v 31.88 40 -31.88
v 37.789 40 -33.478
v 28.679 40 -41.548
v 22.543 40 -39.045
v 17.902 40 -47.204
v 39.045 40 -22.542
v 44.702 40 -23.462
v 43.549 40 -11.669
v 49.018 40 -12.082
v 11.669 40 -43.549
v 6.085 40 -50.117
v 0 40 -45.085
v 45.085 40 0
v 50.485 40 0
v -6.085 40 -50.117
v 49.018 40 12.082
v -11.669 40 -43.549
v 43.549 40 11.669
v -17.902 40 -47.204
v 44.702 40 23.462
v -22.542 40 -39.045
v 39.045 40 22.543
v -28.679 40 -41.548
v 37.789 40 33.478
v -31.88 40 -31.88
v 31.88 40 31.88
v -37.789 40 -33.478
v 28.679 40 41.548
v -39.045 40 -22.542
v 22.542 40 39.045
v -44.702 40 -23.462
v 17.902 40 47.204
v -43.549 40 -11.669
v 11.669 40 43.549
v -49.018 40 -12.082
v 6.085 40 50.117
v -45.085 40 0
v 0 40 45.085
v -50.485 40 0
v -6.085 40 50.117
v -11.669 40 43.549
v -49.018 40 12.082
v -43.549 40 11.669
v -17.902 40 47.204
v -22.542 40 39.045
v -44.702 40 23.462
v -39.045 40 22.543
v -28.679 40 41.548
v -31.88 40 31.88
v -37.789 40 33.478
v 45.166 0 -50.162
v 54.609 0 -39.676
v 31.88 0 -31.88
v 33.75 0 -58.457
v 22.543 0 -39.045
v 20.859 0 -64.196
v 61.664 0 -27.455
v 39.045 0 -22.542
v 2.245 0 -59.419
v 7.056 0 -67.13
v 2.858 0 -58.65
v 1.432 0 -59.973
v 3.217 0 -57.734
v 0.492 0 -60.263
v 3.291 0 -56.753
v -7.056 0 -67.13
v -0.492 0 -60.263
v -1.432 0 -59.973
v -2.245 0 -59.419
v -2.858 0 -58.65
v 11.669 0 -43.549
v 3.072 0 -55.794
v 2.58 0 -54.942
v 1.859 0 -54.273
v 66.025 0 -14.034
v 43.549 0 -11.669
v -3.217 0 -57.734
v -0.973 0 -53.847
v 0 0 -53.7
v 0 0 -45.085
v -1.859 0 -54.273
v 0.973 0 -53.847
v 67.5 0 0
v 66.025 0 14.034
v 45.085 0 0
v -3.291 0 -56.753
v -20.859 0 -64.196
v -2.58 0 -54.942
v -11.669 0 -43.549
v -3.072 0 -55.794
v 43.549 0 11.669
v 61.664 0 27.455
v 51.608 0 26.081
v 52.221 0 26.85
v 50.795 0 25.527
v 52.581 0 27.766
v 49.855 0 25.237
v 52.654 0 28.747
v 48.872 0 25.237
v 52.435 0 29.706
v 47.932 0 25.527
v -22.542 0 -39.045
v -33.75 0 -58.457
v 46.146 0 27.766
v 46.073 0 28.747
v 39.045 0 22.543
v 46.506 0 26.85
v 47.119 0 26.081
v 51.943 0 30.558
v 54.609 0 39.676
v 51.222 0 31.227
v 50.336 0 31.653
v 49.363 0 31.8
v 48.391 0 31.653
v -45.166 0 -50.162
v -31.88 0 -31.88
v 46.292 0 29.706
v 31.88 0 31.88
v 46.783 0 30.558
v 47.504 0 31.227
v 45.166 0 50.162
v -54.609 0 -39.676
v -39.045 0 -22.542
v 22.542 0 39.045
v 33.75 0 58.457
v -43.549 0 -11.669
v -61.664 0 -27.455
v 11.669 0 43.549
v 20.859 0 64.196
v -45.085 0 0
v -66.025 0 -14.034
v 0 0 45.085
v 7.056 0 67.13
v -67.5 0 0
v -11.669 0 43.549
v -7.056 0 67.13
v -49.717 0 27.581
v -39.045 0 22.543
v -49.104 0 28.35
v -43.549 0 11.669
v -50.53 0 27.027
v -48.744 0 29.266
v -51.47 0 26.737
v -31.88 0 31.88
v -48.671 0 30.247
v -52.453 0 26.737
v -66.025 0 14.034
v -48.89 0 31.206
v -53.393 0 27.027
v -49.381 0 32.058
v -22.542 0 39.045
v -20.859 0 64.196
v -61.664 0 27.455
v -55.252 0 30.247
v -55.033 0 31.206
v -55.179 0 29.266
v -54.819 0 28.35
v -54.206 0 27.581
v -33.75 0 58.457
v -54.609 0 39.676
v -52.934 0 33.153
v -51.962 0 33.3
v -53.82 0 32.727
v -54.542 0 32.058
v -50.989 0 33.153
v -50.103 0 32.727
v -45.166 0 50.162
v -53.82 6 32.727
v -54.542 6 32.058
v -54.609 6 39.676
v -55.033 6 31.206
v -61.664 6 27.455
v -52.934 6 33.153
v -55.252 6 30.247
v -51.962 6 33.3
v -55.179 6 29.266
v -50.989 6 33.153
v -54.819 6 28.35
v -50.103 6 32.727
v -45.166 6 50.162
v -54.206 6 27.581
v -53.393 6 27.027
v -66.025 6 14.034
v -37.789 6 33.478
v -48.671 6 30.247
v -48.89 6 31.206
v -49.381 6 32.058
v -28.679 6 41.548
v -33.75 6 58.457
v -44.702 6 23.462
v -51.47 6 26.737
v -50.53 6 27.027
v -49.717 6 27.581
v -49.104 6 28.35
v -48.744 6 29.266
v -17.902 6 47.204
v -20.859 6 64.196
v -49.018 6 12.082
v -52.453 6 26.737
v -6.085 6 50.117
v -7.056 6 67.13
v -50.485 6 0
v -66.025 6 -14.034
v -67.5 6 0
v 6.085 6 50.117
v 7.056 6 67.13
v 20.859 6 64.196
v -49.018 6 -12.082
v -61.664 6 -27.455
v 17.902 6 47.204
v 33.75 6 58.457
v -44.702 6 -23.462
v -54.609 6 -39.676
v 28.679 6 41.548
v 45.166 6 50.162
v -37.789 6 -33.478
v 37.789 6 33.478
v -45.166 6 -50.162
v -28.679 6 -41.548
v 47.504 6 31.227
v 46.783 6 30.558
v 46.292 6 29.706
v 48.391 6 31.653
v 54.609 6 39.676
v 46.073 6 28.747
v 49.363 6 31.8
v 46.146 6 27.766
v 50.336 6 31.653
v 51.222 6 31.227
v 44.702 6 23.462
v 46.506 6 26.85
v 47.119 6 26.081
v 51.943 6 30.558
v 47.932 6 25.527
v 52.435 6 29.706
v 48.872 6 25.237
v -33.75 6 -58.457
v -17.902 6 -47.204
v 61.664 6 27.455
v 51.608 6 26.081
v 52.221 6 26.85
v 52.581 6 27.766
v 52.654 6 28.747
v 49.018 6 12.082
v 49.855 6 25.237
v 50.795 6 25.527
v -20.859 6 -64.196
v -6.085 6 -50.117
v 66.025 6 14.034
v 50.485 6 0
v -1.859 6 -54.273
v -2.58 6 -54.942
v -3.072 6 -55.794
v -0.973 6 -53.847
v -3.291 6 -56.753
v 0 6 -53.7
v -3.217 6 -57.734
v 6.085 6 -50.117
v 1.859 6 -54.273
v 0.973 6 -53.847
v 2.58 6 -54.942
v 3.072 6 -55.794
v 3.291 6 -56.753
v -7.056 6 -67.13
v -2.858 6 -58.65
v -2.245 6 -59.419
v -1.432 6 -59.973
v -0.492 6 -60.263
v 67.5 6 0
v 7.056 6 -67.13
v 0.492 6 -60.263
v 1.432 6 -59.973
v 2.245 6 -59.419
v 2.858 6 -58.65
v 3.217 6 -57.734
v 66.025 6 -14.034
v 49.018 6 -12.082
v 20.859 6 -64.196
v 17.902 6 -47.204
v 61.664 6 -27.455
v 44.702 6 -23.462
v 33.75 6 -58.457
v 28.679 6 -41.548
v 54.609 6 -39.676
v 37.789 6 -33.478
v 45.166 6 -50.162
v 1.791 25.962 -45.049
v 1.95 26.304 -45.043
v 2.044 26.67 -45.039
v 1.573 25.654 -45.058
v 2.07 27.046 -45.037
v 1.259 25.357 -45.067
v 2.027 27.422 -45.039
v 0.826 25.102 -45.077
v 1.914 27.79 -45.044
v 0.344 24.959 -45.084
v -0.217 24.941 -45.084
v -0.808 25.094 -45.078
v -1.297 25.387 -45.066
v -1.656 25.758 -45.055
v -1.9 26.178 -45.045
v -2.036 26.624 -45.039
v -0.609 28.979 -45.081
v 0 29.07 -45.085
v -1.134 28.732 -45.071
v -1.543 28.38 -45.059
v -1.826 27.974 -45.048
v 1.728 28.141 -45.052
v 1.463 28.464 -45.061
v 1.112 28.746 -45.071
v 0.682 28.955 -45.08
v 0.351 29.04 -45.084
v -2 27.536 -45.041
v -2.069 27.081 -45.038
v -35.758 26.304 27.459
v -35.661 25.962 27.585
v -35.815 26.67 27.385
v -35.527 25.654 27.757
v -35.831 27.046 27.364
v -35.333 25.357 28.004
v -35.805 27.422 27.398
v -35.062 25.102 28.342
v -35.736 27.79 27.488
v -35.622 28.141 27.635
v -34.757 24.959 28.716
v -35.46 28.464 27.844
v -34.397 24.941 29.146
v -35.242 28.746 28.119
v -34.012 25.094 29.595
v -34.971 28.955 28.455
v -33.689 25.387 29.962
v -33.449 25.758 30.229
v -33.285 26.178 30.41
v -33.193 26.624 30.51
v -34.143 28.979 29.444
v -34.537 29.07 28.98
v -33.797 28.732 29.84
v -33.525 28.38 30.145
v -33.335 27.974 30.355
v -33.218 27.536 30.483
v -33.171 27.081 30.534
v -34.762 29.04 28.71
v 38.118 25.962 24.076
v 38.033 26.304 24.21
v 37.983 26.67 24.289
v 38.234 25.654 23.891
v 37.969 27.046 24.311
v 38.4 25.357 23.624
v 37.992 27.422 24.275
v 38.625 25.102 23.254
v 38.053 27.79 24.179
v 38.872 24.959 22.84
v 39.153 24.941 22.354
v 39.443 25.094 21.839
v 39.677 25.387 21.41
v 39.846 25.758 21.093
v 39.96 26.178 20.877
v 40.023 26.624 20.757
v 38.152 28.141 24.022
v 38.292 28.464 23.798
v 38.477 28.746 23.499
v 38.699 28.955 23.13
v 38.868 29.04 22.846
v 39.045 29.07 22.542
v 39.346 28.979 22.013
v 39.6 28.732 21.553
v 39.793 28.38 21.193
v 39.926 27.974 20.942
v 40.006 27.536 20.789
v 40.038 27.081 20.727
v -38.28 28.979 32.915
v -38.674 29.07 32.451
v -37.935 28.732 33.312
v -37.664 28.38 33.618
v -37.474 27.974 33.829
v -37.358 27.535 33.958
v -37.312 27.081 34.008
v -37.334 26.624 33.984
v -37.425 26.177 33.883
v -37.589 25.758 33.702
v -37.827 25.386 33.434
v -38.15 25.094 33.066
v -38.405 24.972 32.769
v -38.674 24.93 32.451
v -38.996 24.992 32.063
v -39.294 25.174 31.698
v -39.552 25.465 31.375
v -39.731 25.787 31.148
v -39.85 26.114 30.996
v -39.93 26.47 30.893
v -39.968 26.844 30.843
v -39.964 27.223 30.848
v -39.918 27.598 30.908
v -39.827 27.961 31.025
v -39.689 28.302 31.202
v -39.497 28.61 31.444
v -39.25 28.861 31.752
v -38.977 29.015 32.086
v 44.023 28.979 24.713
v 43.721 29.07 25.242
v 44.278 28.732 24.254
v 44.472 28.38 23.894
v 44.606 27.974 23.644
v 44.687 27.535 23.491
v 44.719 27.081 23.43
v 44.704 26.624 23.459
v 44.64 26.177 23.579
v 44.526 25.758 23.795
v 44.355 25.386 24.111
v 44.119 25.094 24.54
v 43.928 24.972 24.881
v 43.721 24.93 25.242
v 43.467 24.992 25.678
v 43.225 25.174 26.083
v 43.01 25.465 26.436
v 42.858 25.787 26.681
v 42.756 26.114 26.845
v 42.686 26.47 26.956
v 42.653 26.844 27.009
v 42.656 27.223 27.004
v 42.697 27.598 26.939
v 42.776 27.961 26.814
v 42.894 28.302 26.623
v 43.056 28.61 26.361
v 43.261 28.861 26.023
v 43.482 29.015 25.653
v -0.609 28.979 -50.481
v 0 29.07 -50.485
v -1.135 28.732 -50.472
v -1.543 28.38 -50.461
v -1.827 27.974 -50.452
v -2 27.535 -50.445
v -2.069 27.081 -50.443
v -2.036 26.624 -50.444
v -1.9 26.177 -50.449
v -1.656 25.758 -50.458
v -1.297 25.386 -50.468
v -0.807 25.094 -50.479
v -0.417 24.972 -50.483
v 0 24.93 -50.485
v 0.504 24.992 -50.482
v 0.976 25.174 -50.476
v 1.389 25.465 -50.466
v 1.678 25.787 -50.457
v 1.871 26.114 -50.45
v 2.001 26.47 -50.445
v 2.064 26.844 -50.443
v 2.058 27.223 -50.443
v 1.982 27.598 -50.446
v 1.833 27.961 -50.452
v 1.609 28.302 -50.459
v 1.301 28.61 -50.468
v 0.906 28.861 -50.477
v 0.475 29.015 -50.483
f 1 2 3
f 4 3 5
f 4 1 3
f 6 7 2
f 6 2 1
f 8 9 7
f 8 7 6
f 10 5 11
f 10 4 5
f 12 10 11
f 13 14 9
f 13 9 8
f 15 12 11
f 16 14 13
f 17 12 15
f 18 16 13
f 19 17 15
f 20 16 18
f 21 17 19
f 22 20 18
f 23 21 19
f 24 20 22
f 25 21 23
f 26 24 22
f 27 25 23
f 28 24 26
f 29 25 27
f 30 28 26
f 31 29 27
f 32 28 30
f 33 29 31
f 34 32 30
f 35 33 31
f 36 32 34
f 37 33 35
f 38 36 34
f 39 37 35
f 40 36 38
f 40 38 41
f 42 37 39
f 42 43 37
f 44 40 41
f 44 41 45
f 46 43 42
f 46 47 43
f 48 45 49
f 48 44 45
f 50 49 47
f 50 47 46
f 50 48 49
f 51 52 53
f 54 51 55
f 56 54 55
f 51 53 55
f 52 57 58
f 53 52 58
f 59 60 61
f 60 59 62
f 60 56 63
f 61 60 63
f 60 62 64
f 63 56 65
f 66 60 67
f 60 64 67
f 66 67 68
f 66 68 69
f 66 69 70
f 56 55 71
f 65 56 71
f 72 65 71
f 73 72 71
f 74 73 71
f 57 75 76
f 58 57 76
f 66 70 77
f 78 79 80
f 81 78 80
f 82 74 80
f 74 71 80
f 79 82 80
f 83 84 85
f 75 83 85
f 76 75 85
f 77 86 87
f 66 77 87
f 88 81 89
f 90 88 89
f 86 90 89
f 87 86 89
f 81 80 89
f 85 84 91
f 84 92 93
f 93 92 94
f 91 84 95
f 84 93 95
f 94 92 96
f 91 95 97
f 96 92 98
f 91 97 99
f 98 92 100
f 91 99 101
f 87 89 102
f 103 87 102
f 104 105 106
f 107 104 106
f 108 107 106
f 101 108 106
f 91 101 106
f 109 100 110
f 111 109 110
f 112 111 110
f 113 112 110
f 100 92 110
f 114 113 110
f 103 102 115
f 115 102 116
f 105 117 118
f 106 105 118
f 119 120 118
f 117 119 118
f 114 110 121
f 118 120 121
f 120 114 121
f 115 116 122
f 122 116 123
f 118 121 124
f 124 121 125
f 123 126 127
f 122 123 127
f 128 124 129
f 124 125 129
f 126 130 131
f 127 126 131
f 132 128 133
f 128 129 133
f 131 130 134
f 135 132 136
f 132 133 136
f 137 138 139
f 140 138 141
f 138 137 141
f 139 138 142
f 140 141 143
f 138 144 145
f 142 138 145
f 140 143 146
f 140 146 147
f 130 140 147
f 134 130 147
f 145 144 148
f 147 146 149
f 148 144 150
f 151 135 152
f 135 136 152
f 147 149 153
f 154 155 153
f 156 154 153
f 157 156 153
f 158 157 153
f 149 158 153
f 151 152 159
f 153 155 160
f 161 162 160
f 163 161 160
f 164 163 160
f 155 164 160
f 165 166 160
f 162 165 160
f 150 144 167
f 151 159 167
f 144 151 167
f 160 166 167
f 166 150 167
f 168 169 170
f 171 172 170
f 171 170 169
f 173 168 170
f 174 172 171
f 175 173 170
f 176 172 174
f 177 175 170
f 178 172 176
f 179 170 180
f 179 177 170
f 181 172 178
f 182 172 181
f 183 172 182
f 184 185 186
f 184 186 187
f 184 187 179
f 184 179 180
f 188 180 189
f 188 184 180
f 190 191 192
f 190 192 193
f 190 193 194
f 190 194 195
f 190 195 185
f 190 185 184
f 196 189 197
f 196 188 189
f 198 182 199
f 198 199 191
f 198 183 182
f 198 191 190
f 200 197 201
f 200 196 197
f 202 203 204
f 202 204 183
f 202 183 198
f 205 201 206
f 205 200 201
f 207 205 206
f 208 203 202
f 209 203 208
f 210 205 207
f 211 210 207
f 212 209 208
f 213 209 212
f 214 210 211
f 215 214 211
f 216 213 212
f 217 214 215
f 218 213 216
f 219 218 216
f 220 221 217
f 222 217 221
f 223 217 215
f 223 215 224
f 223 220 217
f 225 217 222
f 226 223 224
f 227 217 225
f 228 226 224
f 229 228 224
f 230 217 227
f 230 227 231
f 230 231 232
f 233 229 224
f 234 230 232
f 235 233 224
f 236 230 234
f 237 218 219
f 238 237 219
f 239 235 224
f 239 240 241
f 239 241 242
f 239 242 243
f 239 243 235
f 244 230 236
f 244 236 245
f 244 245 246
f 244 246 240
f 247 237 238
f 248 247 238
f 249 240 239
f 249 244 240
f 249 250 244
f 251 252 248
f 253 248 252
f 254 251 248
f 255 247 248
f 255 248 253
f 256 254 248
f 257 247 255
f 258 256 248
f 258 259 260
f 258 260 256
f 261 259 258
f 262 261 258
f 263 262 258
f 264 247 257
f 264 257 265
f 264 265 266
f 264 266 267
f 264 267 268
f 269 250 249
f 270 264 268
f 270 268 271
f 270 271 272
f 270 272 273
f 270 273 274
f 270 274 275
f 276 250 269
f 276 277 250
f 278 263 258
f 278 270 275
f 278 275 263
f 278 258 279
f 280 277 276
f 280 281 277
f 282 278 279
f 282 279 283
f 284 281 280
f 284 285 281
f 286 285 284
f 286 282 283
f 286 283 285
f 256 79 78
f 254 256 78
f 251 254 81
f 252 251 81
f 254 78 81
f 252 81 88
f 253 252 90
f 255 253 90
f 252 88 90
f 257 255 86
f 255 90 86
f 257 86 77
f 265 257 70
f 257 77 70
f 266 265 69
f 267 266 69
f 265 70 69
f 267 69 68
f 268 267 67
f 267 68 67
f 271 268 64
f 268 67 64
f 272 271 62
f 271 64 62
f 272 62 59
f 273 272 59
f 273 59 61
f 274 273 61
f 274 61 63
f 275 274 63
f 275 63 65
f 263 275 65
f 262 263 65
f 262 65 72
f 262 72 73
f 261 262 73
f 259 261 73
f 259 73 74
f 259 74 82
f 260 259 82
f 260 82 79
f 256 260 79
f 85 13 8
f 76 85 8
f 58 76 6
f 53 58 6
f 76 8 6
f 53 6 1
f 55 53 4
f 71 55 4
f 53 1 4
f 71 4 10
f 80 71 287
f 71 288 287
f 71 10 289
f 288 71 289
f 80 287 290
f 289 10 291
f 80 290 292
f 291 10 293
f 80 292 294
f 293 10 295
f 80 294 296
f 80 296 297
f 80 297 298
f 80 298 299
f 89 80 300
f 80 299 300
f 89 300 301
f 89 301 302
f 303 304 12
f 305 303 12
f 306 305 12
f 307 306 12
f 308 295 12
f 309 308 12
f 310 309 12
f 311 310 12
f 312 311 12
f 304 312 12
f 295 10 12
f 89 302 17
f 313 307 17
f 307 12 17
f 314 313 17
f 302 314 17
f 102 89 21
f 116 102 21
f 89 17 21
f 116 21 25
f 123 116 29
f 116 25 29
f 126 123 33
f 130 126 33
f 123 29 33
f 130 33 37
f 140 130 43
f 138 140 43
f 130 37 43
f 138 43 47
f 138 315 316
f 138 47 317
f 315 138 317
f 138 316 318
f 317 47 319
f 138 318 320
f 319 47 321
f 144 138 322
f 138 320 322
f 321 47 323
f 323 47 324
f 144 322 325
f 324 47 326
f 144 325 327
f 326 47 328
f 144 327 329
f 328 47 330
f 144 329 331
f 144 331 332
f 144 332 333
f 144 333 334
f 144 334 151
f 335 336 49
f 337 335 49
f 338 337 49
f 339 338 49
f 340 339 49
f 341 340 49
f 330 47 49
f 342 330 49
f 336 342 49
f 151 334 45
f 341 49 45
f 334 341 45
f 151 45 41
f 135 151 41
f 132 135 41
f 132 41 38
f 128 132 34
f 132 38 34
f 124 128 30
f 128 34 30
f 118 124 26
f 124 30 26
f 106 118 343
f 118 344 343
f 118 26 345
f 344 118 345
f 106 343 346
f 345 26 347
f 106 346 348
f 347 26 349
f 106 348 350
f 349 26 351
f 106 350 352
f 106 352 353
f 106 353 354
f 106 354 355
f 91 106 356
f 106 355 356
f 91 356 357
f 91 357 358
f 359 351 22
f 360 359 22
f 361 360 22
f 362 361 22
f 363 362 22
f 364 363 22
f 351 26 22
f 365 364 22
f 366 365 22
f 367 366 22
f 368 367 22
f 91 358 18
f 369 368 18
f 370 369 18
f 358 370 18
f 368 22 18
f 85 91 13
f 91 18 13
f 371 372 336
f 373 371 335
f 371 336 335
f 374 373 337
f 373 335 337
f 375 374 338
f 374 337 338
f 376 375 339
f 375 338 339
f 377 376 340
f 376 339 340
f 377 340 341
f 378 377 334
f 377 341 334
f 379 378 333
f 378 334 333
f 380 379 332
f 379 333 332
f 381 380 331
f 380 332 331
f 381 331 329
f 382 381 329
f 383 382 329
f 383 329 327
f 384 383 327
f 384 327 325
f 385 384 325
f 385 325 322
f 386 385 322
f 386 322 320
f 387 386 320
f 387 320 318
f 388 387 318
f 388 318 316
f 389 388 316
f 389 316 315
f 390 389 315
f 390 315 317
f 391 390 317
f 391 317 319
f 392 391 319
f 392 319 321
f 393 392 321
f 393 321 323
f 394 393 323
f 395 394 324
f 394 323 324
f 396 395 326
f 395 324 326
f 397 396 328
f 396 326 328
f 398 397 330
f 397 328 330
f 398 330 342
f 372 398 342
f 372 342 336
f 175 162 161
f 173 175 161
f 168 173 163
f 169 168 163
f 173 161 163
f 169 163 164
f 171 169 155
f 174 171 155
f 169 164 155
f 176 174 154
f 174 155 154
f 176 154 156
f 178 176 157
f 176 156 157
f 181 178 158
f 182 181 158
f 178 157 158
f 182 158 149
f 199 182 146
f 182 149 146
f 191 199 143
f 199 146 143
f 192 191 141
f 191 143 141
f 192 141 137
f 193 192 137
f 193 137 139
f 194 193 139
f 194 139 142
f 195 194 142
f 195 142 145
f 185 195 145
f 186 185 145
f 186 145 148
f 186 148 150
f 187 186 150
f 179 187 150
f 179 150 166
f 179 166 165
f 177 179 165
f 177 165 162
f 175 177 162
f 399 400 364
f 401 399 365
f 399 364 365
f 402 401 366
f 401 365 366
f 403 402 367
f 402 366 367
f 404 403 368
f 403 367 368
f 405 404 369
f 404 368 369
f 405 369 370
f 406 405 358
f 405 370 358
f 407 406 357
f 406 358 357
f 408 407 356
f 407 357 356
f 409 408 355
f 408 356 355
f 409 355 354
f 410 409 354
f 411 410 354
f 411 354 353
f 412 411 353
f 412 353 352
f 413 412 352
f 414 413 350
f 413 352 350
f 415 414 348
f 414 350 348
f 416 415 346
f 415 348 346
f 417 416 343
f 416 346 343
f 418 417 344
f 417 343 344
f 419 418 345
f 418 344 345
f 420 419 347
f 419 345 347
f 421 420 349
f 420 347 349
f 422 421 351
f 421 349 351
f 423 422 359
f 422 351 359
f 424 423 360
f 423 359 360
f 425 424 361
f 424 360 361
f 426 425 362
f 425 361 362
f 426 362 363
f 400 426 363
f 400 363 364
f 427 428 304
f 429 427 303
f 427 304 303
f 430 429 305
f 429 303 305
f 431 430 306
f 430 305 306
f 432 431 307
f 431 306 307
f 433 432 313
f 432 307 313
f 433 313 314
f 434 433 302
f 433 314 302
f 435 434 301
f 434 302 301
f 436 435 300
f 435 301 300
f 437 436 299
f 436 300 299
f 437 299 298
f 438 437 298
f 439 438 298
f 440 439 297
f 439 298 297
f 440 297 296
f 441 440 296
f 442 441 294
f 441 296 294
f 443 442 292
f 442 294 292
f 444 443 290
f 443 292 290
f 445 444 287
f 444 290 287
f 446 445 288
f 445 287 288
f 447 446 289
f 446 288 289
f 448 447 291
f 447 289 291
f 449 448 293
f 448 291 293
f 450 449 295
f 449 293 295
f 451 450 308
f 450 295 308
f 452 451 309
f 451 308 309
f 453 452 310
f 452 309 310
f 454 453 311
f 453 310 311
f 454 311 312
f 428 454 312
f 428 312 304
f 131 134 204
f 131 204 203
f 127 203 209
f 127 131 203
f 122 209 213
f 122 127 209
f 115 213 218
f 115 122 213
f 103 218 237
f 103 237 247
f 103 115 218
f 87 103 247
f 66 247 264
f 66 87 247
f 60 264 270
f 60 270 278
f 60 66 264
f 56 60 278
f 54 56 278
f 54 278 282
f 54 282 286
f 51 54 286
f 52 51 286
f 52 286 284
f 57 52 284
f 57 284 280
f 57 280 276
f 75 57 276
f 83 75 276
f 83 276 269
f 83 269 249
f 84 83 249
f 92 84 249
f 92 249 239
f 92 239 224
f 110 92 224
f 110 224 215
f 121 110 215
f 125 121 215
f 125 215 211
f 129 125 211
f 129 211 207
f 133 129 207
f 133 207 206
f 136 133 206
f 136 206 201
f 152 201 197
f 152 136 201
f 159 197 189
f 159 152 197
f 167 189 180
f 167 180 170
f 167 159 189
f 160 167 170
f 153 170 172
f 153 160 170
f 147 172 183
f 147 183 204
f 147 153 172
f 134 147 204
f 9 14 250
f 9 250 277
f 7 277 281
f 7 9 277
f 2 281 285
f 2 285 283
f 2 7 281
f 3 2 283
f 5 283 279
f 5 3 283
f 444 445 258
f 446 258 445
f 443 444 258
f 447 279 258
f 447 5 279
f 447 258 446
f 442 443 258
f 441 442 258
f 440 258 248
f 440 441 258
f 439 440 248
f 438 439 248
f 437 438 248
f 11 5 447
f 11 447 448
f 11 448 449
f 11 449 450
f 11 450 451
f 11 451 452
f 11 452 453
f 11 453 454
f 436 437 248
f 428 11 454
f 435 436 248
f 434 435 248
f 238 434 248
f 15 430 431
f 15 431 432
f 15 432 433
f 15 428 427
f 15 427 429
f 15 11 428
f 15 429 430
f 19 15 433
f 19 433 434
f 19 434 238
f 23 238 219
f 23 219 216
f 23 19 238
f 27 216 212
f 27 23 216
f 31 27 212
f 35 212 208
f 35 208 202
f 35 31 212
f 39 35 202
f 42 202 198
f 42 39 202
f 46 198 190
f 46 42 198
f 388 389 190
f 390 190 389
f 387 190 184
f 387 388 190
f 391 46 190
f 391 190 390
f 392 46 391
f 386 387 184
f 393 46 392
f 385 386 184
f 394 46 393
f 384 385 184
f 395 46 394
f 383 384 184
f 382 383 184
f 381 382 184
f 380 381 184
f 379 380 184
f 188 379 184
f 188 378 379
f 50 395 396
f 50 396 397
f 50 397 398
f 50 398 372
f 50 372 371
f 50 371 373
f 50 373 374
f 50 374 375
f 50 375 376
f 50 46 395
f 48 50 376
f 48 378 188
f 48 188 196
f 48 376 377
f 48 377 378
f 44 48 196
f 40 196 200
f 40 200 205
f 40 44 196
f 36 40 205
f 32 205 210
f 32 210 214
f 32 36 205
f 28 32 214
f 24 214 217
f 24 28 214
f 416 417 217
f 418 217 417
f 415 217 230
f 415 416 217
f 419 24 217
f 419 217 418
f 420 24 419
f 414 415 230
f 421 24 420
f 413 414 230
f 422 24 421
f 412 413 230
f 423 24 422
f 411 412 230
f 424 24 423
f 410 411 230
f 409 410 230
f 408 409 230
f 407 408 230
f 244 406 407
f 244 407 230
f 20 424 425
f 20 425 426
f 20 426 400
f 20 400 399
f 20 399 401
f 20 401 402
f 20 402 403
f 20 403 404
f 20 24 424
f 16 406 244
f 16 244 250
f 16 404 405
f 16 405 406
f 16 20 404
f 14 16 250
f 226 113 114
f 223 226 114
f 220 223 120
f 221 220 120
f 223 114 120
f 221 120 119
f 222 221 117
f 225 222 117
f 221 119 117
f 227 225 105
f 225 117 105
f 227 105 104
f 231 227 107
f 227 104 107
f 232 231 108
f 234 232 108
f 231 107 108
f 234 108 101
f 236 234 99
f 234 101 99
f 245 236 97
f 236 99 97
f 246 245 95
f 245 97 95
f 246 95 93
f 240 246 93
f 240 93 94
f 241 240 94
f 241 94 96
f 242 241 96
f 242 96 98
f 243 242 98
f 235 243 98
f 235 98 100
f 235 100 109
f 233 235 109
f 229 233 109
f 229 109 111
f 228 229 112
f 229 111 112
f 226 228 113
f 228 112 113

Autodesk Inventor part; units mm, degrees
ref_plane "YZ Plane" through (0, 0, 0) normal (1, 0, 0) x (0, 1, 0)
ref_plane "XZ Plane" through (0, 0, 0) normal (0, 1, 0) x (-1, 0, 0)
sketch "Sketch1" plane through (0, 0, 0) normal (0, 1, 0) x (-1, 0, 0)
  circle A0 centre (0, 0) radius 67.5
  dimension "d0" = 135
extrude "body" add sketch "Sketch1" along normal blind 40
sketch "Sketch2" plane through (0, 40, 0) normal (0, 1, 0) x (1, 0, 0)
  circle A0 centre (0, 0) radius 67.5 projected
  circle A1 centre (0, 0) radius 45.085
  dimension "d4" = 90.17
extrude "hole" cut sketch "Sketch2" against normal blind 101.6 contours A1
sketch "Sketch3" plane through (0, 40, 0) normal (0, 1, 0) x (1, 0, 0)
  circle A0 centre (0, 0) radius 45.085 projected
  circle A1 centre (0, 0) radius 67.5 projected
  circle A2 centre (0, 0) radius 50.485
  dimension "d9" = 5.4
extrude "flange" cut sketch "Sketch3" against normal blind 34 contours A1
sketch "Sketch4" plane through (0, 40, 0) normal (0, 1, 0) x (1, 0, 0)
  circle A0 centre (0, 0) radius 50.485 projected
  circle A1 centre (0, 0) radius 45.085 projected
  point P0 (0, 50.485)
ref_plane "Work Plane1" through (0, 40, -50.485) normal (0, 0, -1) x (-1, 0, 0)
sketch "Sketch5" plane through (0, 40, -50.485) normal (0, 0, -1) x (-1, 0, 0)
  circle A0 centre (0, -13) radius 2.54
  line L0 (50.485, 0) -> (-50.485, 0) projected
  point P0 (0, -40)
  dimension "d12" = 13
  dimension "d13" = 5.08
hole "sideHoleSE" at (0, 27, -50.485) direction (0, 0, 1) diameter 4.1402 depth 25.4 tip angle 118
pattern_circular "sideHoleSW" count 2 over 120 about axis through (0, 40, 0) along (0, -1, 0) of "sideHoleSE"
pattern_circular "sideHoleN" count 2 over 130 about axis through (0, 40, 0) along (0, 1, 0) of "sideHoleSE"
sketch "Sketch8" plane through (0, 6, 0) normal (0, 1, 0) x (1, 0, 0)
  circle A0 centre (0, 0) radius 50.485 projected
  circle A1 centre (0, 0) radius 67.5 projected
  circle A2 centre (0, 57) radius 3.1903
  line L0 (0, 0) -> (49.3634, -28.5) construction
  line L1 (0, 0) -> (57, 0) construction
  circle A3 centre (49.3634, -28.5) radius 3.101
  line L2 (0, 0) -> (-51.9615, -30) construction
  line L3 (0, 0) -> (60, 0) construction
  circle A4 centre (-51.9615, -30) radius 3.5807
  dimension "d65" = 57
  dimension "d66" = 57
  dimension "d67" = 30
  dimension "d68" = 60
  dimension "d69" = 150
hole "Hole5" at (0, 6, -57) at (49.3634, 6, 28.5) at (-51.9615, 6, 30) direction (0, -1, 0) diameter 6.6 end through all clearance for "Flat Head Machine Screw" size "M6" standard "Ansi Metric M Profile"
properties part number "2f1col" material "Aluminum 6061"
